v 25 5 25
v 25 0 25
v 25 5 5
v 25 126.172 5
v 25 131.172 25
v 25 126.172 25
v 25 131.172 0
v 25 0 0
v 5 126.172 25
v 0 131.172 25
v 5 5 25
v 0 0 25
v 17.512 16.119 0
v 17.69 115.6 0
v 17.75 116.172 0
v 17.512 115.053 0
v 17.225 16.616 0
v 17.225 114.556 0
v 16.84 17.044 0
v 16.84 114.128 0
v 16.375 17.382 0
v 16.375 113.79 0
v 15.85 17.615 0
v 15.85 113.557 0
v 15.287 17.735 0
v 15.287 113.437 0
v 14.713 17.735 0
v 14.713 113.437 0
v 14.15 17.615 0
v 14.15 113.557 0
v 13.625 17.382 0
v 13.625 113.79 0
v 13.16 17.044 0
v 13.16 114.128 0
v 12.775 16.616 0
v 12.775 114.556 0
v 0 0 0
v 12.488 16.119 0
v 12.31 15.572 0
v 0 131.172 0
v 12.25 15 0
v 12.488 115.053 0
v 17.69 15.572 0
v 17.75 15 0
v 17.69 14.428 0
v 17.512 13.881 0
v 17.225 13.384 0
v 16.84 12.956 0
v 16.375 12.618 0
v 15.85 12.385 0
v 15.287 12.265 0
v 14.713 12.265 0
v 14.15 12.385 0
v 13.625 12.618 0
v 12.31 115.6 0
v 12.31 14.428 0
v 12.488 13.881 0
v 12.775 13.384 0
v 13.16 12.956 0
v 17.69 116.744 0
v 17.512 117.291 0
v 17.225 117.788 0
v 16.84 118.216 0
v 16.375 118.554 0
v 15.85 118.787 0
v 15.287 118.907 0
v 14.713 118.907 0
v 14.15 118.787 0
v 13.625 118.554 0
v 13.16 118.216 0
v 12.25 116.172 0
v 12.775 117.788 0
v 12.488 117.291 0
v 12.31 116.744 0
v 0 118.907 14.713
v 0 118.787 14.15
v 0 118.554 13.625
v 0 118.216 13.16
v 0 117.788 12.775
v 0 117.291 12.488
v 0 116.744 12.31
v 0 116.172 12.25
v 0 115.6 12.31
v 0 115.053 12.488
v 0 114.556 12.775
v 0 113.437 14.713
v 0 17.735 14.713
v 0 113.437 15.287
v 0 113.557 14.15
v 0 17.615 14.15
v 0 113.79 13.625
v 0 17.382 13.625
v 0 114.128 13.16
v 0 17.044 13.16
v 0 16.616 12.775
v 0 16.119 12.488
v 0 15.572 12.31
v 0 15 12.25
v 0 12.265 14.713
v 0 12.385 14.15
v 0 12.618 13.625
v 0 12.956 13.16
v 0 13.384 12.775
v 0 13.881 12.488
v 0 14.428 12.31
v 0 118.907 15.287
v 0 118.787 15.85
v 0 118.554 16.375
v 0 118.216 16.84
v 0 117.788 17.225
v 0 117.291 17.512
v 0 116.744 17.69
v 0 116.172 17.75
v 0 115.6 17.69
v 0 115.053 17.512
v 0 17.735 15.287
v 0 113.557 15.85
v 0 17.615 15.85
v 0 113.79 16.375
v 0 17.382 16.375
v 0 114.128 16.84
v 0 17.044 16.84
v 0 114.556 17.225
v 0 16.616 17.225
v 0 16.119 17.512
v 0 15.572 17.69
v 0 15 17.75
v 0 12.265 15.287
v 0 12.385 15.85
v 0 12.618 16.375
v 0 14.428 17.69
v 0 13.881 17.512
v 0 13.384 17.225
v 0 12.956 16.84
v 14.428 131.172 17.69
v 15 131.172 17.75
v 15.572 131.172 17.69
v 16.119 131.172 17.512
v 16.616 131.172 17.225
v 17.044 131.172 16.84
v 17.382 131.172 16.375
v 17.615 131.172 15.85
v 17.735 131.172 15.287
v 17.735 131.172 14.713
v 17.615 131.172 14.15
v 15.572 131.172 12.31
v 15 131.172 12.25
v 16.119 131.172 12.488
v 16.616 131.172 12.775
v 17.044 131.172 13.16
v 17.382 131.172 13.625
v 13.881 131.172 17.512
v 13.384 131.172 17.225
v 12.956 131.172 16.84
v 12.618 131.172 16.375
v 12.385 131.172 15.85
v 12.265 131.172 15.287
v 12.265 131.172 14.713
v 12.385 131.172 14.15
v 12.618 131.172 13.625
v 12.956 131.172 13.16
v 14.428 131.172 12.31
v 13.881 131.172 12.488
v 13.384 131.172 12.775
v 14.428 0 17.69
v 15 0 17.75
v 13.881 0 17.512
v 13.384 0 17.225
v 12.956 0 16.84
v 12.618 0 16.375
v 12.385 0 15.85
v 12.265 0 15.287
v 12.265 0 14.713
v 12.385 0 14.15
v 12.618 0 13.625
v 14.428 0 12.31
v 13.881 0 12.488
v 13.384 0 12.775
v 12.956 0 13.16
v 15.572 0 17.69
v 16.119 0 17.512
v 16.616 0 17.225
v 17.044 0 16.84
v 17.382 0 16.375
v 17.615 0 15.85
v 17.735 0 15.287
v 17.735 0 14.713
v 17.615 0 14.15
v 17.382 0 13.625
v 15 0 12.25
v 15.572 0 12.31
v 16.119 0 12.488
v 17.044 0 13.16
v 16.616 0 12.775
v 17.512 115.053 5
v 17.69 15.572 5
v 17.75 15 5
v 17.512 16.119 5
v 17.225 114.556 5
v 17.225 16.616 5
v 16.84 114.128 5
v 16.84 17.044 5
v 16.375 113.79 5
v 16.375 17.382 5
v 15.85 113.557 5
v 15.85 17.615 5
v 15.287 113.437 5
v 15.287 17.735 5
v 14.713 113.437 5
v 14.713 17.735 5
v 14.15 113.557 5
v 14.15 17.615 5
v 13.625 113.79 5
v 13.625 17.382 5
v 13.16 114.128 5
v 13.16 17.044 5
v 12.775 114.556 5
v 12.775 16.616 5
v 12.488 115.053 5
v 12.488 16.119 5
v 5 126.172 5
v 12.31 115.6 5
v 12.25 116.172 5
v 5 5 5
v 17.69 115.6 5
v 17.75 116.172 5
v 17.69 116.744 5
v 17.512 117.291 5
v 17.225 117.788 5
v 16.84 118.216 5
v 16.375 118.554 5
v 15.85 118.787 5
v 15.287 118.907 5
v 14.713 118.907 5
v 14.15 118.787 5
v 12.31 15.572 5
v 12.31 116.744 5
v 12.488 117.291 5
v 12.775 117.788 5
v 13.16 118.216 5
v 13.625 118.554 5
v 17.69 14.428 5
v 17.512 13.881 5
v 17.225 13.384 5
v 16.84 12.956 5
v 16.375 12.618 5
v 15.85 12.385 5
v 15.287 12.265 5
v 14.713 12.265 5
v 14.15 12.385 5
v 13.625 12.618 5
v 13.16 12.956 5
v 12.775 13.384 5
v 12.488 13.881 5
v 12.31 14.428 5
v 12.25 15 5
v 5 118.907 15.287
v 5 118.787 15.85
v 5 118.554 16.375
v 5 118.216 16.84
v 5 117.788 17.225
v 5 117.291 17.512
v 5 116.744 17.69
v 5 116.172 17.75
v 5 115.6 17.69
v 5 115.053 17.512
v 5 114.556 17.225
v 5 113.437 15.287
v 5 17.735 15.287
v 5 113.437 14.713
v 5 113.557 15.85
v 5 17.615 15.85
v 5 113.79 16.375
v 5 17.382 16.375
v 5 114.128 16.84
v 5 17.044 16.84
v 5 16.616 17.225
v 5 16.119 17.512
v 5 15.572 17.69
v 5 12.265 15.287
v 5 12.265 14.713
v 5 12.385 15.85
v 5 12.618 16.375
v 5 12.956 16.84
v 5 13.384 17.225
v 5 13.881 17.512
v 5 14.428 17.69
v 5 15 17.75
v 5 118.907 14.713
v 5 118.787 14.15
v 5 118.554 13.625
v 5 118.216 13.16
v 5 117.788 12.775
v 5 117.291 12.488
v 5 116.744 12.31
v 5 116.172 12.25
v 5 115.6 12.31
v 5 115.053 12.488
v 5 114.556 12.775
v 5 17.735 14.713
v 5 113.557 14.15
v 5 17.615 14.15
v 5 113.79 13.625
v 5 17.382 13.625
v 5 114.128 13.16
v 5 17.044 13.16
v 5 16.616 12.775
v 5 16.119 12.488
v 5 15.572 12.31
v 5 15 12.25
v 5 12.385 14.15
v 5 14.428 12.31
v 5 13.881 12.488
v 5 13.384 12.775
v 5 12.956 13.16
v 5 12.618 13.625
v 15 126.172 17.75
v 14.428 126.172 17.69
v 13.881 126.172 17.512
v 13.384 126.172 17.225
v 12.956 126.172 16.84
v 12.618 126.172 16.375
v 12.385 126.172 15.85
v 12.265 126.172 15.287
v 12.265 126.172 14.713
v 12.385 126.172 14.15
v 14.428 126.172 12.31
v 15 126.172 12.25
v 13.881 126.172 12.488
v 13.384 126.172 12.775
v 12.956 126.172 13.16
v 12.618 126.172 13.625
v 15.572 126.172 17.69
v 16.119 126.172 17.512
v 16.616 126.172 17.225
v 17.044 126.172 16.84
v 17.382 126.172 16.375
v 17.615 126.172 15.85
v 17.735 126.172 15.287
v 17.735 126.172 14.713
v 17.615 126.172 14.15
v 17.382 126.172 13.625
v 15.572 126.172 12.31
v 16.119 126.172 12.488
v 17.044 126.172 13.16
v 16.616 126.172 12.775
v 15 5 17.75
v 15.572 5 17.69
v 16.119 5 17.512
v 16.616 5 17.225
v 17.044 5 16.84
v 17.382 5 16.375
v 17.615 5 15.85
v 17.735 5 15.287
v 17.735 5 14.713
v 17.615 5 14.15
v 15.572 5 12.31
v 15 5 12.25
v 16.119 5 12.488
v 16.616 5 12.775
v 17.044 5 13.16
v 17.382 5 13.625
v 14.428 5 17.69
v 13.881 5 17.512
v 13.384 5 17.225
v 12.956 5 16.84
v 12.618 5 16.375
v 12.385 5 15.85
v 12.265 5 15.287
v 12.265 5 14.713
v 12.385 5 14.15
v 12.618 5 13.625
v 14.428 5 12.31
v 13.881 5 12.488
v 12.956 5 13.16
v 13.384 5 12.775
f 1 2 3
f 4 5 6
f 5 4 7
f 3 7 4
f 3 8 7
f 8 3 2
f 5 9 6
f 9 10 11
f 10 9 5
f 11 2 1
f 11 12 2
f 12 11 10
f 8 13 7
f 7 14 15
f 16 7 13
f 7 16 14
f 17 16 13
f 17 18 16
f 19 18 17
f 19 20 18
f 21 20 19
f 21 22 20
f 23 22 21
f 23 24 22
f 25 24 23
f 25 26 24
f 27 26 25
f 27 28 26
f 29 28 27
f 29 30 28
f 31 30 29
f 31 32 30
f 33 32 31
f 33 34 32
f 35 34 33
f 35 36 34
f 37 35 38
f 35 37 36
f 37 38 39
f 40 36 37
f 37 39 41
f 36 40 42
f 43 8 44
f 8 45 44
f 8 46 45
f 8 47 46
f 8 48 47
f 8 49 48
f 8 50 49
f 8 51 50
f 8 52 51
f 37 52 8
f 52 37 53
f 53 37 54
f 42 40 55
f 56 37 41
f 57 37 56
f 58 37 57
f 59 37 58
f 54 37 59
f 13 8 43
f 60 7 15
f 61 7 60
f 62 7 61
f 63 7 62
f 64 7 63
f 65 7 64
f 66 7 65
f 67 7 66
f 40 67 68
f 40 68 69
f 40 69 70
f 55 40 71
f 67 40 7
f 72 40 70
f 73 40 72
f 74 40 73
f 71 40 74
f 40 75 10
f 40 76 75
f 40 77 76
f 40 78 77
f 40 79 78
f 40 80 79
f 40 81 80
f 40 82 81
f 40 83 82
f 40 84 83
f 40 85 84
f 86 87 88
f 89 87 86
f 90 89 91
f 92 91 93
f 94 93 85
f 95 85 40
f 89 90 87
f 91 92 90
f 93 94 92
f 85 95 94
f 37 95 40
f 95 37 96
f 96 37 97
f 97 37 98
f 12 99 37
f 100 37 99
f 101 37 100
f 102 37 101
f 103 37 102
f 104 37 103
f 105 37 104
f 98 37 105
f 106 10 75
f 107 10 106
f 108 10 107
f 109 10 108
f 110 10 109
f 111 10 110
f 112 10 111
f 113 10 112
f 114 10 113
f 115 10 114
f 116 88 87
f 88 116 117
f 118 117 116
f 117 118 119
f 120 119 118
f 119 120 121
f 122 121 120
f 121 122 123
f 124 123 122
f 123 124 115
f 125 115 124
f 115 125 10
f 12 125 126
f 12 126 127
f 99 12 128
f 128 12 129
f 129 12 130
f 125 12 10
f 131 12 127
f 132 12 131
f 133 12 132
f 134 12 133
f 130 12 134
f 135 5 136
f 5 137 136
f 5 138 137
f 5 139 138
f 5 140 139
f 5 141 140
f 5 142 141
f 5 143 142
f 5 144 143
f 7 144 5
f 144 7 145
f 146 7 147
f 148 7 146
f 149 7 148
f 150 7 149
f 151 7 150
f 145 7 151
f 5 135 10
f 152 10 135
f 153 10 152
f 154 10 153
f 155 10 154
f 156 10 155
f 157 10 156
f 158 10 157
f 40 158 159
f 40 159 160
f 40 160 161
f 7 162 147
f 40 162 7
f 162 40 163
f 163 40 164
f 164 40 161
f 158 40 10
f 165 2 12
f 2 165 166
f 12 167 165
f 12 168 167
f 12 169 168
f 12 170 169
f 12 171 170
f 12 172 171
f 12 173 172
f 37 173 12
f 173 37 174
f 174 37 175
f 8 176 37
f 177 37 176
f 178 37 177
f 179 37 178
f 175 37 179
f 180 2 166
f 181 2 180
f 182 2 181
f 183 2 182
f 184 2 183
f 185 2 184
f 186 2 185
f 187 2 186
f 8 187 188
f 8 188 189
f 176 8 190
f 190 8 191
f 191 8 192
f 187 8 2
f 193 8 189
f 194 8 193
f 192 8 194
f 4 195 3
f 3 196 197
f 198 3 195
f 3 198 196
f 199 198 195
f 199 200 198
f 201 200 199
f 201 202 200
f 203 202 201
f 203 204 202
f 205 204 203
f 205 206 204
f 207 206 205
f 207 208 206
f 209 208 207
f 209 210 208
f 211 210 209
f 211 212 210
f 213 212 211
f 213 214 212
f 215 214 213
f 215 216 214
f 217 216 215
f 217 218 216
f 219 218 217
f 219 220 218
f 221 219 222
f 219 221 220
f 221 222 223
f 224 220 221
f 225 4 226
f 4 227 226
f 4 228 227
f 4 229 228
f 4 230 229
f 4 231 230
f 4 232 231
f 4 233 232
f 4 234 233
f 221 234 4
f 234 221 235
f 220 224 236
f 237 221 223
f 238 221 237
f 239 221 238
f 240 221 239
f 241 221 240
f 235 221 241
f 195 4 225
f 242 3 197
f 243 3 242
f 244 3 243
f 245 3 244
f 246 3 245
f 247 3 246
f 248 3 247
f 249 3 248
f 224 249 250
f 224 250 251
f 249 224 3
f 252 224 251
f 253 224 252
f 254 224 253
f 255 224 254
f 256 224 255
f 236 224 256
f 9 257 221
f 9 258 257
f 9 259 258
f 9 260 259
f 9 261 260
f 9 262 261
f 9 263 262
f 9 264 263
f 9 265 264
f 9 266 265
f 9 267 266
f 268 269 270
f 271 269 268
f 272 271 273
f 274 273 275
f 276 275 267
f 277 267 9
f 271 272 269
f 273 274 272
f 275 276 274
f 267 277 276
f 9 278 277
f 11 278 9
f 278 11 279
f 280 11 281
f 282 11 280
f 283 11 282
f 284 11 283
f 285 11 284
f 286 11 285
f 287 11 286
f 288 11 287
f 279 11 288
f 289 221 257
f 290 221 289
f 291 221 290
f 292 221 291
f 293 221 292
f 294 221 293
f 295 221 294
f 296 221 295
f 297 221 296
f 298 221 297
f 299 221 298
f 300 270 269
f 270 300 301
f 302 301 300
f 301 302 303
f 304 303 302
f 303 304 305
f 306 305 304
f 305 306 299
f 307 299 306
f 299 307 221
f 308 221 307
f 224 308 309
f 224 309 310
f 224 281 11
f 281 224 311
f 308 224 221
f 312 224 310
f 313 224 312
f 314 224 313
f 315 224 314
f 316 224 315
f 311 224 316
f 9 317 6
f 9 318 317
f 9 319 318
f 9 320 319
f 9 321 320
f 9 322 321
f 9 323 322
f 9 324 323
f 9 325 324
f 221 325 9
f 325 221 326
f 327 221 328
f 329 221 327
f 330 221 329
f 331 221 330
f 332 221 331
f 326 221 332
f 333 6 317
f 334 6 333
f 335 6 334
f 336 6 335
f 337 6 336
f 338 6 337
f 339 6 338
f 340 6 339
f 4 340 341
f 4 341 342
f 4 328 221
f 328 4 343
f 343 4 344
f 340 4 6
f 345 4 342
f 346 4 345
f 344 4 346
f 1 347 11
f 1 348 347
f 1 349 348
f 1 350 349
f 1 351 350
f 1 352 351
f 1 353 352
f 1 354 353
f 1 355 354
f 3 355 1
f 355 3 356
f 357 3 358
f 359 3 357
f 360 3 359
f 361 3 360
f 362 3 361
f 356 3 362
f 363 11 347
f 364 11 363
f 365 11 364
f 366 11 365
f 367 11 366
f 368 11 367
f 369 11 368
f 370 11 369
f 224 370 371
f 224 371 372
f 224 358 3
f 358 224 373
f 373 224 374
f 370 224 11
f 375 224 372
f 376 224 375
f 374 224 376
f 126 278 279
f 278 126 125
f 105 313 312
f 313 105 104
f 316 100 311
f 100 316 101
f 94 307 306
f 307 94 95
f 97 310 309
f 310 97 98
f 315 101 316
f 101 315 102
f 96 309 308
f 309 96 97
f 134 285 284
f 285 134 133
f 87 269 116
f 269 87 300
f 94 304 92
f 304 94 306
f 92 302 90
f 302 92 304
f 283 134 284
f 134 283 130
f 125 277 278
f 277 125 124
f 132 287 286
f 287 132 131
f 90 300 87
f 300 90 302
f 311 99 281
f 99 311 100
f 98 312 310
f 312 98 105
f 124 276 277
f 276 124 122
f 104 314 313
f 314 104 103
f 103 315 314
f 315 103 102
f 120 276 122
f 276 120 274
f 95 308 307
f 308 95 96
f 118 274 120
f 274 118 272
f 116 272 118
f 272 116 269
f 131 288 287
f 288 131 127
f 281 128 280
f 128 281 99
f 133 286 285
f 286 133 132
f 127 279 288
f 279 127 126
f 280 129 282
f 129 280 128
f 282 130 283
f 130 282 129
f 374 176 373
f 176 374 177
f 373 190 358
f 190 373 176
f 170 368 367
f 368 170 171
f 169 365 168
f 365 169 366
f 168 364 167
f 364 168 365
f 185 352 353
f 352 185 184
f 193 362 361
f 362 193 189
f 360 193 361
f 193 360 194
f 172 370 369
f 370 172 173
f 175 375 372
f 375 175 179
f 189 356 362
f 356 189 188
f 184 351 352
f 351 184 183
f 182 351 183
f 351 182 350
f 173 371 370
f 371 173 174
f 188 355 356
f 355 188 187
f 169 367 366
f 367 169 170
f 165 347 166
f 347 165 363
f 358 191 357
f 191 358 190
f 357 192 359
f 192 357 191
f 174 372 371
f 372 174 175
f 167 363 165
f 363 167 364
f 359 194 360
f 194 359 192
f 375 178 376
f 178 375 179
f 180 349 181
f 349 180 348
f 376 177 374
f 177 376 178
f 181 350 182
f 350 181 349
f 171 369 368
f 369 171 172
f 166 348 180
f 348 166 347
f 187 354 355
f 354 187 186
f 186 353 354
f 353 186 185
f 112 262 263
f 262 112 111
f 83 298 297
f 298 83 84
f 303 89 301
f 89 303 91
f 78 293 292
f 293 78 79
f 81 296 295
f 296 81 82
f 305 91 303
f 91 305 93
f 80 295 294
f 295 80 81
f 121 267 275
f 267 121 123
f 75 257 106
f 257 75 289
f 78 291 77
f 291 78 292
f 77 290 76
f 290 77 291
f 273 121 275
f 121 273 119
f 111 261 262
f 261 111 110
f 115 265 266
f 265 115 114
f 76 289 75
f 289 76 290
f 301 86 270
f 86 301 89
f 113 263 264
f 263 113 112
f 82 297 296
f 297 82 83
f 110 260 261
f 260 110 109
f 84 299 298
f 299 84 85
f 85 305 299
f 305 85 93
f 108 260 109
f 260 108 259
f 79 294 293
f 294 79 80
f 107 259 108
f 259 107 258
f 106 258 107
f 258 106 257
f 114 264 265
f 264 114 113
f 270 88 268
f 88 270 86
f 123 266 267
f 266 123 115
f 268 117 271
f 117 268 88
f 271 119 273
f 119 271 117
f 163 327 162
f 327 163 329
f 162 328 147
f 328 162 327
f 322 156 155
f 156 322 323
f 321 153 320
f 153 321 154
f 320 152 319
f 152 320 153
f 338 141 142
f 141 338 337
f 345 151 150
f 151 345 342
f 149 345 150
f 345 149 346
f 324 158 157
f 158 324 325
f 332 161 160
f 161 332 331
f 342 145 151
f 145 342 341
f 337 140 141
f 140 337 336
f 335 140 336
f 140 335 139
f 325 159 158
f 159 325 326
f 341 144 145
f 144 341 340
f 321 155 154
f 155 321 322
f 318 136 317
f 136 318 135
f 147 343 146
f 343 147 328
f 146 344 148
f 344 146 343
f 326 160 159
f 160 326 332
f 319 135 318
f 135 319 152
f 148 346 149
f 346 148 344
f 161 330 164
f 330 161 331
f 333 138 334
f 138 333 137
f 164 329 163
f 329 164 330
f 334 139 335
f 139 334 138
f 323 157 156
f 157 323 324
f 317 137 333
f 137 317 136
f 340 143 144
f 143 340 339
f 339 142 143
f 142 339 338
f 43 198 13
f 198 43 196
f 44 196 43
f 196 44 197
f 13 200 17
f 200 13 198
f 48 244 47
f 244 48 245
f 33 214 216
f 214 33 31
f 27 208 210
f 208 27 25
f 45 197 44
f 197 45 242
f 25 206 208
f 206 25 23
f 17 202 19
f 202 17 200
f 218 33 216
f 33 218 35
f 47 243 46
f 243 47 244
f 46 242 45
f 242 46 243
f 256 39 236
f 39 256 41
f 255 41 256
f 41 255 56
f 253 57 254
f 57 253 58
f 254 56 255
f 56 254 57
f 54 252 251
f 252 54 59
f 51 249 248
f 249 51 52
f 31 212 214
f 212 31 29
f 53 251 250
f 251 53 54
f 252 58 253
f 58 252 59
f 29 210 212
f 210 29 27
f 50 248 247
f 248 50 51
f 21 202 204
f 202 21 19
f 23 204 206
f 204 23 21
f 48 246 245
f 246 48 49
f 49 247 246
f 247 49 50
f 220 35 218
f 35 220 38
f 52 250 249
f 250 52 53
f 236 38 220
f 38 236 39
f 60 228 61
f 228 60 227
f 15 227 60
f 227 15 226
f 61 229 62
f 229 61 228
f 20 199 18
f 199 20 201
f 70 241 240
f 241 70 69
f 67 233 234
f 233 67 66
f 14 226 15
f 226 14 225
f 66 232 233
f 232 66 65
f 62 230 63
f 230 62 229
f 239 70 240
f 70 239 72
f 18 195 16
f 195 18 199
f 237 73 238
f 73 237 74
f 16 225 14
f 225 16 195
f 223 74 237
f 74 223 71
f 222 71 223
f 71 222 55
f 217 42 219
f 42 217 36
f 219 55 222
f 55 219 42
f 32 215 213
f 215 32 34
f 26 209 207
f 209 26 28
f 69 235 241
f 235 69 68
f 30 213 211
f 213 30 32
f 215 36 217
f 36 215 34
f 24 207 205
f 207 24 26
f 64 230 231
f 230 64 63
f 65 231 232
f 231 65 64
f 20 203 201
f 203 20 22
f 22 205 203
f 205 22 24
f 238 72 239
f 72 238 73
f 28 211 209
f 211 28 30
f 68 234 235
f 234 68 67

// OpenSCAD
$fn = 30;

// The width of the border in mm
borderWidth = 5;

// The spacing between the mounting holes
// 78 for the ERCF v1.0, 101.172 for the ERCP v1.1
holeSpacing = 101.172;

// The size of the extrusions (only square supported)
extrusionSize = 20;

// Calculates the spacing between both extrusions
extrusionSpacing = holeSpacing - 20;

difference()
    {
        // Bigger outside cube
        cube([ extrusionSize + borderWidth,
               extrusionSize * 2 + extrusionSpacing + borderWidth * 2,
               extrusionSize + borderWidth ]);

        // Smaller inside cube
        translate([borderWidth, borderWidth, borderWidth])
        {
            cube([ extrusionSize,
                   extrusionSize * 2 + extrusionSpacing,
                   extrusionSize ]);
        }

        // Left screw hole, parallel to the extrusion
        translate([ 0,
                    extrusionSize / 2 + borderWidth,
                    extrusionSize / 2 + borderWidth])
        {
            rotate([0, 90, 0])
            {
                cylinder(d = 5.5, h = borderWidth);
            }
        }

        // Left screw hole, perpendicular to the extrusion
        
        translate([ extrusionSize / 2 + borderWidth,
                    0,
                    extrusionSize / 2 + borderWidth])
        {
            rotate([0, 90, 90])
            {
                cylinder(d = 5.5, h = borderWidth);
            }
        }


        // Right screw hole, parallel to the extrusion
        translate([ 0,
                    extrusionSize / 2 + borderWidth + extrusionSpacing + extrusionSize,
                    extrusionSize / 2 + borderWidth])
        {
            rotate([0, 90, 0])
            {
                cylinder(d = 5.5, h = borderWidth);
            }

        }
        
        // Right screw hole, perpendicular to the extrusion
        translate([ extrusionSize / 2 + borderWidth,
                    extrusionSize + borderWidth + extrusionSpacing + extrusionSize,
                    extrusionSize / 2 + borderWidth])
        {
            rotate([0, 90, 90])
            {
                cylinder(d = 5.5, h = borderWidth);
            }

        }
        
        // Left screw hole, bottom of the extrusion
        translate([ extrusionSize / 2 + borderWidth,
                    extrusionSize / 2 + borderWidth,
                    0
                    ])
        {
            rotate([0, 0, 0])
            {
                cylinder(d = 5.5, h = borderWidth);
            }
        }

        // Right screw hole, bottom of the extrusion
        translate([ extrusionSize / 2 + borderWidth,
                    extrusionSize / 2 + borderWidth + extrusionSpacing + extrusionSize,
                    0])
        {
            rotate([0, 0, 0])
            {
                cylinder(d = 5.5, h = borderWidth);
            }
        }
    }
        
